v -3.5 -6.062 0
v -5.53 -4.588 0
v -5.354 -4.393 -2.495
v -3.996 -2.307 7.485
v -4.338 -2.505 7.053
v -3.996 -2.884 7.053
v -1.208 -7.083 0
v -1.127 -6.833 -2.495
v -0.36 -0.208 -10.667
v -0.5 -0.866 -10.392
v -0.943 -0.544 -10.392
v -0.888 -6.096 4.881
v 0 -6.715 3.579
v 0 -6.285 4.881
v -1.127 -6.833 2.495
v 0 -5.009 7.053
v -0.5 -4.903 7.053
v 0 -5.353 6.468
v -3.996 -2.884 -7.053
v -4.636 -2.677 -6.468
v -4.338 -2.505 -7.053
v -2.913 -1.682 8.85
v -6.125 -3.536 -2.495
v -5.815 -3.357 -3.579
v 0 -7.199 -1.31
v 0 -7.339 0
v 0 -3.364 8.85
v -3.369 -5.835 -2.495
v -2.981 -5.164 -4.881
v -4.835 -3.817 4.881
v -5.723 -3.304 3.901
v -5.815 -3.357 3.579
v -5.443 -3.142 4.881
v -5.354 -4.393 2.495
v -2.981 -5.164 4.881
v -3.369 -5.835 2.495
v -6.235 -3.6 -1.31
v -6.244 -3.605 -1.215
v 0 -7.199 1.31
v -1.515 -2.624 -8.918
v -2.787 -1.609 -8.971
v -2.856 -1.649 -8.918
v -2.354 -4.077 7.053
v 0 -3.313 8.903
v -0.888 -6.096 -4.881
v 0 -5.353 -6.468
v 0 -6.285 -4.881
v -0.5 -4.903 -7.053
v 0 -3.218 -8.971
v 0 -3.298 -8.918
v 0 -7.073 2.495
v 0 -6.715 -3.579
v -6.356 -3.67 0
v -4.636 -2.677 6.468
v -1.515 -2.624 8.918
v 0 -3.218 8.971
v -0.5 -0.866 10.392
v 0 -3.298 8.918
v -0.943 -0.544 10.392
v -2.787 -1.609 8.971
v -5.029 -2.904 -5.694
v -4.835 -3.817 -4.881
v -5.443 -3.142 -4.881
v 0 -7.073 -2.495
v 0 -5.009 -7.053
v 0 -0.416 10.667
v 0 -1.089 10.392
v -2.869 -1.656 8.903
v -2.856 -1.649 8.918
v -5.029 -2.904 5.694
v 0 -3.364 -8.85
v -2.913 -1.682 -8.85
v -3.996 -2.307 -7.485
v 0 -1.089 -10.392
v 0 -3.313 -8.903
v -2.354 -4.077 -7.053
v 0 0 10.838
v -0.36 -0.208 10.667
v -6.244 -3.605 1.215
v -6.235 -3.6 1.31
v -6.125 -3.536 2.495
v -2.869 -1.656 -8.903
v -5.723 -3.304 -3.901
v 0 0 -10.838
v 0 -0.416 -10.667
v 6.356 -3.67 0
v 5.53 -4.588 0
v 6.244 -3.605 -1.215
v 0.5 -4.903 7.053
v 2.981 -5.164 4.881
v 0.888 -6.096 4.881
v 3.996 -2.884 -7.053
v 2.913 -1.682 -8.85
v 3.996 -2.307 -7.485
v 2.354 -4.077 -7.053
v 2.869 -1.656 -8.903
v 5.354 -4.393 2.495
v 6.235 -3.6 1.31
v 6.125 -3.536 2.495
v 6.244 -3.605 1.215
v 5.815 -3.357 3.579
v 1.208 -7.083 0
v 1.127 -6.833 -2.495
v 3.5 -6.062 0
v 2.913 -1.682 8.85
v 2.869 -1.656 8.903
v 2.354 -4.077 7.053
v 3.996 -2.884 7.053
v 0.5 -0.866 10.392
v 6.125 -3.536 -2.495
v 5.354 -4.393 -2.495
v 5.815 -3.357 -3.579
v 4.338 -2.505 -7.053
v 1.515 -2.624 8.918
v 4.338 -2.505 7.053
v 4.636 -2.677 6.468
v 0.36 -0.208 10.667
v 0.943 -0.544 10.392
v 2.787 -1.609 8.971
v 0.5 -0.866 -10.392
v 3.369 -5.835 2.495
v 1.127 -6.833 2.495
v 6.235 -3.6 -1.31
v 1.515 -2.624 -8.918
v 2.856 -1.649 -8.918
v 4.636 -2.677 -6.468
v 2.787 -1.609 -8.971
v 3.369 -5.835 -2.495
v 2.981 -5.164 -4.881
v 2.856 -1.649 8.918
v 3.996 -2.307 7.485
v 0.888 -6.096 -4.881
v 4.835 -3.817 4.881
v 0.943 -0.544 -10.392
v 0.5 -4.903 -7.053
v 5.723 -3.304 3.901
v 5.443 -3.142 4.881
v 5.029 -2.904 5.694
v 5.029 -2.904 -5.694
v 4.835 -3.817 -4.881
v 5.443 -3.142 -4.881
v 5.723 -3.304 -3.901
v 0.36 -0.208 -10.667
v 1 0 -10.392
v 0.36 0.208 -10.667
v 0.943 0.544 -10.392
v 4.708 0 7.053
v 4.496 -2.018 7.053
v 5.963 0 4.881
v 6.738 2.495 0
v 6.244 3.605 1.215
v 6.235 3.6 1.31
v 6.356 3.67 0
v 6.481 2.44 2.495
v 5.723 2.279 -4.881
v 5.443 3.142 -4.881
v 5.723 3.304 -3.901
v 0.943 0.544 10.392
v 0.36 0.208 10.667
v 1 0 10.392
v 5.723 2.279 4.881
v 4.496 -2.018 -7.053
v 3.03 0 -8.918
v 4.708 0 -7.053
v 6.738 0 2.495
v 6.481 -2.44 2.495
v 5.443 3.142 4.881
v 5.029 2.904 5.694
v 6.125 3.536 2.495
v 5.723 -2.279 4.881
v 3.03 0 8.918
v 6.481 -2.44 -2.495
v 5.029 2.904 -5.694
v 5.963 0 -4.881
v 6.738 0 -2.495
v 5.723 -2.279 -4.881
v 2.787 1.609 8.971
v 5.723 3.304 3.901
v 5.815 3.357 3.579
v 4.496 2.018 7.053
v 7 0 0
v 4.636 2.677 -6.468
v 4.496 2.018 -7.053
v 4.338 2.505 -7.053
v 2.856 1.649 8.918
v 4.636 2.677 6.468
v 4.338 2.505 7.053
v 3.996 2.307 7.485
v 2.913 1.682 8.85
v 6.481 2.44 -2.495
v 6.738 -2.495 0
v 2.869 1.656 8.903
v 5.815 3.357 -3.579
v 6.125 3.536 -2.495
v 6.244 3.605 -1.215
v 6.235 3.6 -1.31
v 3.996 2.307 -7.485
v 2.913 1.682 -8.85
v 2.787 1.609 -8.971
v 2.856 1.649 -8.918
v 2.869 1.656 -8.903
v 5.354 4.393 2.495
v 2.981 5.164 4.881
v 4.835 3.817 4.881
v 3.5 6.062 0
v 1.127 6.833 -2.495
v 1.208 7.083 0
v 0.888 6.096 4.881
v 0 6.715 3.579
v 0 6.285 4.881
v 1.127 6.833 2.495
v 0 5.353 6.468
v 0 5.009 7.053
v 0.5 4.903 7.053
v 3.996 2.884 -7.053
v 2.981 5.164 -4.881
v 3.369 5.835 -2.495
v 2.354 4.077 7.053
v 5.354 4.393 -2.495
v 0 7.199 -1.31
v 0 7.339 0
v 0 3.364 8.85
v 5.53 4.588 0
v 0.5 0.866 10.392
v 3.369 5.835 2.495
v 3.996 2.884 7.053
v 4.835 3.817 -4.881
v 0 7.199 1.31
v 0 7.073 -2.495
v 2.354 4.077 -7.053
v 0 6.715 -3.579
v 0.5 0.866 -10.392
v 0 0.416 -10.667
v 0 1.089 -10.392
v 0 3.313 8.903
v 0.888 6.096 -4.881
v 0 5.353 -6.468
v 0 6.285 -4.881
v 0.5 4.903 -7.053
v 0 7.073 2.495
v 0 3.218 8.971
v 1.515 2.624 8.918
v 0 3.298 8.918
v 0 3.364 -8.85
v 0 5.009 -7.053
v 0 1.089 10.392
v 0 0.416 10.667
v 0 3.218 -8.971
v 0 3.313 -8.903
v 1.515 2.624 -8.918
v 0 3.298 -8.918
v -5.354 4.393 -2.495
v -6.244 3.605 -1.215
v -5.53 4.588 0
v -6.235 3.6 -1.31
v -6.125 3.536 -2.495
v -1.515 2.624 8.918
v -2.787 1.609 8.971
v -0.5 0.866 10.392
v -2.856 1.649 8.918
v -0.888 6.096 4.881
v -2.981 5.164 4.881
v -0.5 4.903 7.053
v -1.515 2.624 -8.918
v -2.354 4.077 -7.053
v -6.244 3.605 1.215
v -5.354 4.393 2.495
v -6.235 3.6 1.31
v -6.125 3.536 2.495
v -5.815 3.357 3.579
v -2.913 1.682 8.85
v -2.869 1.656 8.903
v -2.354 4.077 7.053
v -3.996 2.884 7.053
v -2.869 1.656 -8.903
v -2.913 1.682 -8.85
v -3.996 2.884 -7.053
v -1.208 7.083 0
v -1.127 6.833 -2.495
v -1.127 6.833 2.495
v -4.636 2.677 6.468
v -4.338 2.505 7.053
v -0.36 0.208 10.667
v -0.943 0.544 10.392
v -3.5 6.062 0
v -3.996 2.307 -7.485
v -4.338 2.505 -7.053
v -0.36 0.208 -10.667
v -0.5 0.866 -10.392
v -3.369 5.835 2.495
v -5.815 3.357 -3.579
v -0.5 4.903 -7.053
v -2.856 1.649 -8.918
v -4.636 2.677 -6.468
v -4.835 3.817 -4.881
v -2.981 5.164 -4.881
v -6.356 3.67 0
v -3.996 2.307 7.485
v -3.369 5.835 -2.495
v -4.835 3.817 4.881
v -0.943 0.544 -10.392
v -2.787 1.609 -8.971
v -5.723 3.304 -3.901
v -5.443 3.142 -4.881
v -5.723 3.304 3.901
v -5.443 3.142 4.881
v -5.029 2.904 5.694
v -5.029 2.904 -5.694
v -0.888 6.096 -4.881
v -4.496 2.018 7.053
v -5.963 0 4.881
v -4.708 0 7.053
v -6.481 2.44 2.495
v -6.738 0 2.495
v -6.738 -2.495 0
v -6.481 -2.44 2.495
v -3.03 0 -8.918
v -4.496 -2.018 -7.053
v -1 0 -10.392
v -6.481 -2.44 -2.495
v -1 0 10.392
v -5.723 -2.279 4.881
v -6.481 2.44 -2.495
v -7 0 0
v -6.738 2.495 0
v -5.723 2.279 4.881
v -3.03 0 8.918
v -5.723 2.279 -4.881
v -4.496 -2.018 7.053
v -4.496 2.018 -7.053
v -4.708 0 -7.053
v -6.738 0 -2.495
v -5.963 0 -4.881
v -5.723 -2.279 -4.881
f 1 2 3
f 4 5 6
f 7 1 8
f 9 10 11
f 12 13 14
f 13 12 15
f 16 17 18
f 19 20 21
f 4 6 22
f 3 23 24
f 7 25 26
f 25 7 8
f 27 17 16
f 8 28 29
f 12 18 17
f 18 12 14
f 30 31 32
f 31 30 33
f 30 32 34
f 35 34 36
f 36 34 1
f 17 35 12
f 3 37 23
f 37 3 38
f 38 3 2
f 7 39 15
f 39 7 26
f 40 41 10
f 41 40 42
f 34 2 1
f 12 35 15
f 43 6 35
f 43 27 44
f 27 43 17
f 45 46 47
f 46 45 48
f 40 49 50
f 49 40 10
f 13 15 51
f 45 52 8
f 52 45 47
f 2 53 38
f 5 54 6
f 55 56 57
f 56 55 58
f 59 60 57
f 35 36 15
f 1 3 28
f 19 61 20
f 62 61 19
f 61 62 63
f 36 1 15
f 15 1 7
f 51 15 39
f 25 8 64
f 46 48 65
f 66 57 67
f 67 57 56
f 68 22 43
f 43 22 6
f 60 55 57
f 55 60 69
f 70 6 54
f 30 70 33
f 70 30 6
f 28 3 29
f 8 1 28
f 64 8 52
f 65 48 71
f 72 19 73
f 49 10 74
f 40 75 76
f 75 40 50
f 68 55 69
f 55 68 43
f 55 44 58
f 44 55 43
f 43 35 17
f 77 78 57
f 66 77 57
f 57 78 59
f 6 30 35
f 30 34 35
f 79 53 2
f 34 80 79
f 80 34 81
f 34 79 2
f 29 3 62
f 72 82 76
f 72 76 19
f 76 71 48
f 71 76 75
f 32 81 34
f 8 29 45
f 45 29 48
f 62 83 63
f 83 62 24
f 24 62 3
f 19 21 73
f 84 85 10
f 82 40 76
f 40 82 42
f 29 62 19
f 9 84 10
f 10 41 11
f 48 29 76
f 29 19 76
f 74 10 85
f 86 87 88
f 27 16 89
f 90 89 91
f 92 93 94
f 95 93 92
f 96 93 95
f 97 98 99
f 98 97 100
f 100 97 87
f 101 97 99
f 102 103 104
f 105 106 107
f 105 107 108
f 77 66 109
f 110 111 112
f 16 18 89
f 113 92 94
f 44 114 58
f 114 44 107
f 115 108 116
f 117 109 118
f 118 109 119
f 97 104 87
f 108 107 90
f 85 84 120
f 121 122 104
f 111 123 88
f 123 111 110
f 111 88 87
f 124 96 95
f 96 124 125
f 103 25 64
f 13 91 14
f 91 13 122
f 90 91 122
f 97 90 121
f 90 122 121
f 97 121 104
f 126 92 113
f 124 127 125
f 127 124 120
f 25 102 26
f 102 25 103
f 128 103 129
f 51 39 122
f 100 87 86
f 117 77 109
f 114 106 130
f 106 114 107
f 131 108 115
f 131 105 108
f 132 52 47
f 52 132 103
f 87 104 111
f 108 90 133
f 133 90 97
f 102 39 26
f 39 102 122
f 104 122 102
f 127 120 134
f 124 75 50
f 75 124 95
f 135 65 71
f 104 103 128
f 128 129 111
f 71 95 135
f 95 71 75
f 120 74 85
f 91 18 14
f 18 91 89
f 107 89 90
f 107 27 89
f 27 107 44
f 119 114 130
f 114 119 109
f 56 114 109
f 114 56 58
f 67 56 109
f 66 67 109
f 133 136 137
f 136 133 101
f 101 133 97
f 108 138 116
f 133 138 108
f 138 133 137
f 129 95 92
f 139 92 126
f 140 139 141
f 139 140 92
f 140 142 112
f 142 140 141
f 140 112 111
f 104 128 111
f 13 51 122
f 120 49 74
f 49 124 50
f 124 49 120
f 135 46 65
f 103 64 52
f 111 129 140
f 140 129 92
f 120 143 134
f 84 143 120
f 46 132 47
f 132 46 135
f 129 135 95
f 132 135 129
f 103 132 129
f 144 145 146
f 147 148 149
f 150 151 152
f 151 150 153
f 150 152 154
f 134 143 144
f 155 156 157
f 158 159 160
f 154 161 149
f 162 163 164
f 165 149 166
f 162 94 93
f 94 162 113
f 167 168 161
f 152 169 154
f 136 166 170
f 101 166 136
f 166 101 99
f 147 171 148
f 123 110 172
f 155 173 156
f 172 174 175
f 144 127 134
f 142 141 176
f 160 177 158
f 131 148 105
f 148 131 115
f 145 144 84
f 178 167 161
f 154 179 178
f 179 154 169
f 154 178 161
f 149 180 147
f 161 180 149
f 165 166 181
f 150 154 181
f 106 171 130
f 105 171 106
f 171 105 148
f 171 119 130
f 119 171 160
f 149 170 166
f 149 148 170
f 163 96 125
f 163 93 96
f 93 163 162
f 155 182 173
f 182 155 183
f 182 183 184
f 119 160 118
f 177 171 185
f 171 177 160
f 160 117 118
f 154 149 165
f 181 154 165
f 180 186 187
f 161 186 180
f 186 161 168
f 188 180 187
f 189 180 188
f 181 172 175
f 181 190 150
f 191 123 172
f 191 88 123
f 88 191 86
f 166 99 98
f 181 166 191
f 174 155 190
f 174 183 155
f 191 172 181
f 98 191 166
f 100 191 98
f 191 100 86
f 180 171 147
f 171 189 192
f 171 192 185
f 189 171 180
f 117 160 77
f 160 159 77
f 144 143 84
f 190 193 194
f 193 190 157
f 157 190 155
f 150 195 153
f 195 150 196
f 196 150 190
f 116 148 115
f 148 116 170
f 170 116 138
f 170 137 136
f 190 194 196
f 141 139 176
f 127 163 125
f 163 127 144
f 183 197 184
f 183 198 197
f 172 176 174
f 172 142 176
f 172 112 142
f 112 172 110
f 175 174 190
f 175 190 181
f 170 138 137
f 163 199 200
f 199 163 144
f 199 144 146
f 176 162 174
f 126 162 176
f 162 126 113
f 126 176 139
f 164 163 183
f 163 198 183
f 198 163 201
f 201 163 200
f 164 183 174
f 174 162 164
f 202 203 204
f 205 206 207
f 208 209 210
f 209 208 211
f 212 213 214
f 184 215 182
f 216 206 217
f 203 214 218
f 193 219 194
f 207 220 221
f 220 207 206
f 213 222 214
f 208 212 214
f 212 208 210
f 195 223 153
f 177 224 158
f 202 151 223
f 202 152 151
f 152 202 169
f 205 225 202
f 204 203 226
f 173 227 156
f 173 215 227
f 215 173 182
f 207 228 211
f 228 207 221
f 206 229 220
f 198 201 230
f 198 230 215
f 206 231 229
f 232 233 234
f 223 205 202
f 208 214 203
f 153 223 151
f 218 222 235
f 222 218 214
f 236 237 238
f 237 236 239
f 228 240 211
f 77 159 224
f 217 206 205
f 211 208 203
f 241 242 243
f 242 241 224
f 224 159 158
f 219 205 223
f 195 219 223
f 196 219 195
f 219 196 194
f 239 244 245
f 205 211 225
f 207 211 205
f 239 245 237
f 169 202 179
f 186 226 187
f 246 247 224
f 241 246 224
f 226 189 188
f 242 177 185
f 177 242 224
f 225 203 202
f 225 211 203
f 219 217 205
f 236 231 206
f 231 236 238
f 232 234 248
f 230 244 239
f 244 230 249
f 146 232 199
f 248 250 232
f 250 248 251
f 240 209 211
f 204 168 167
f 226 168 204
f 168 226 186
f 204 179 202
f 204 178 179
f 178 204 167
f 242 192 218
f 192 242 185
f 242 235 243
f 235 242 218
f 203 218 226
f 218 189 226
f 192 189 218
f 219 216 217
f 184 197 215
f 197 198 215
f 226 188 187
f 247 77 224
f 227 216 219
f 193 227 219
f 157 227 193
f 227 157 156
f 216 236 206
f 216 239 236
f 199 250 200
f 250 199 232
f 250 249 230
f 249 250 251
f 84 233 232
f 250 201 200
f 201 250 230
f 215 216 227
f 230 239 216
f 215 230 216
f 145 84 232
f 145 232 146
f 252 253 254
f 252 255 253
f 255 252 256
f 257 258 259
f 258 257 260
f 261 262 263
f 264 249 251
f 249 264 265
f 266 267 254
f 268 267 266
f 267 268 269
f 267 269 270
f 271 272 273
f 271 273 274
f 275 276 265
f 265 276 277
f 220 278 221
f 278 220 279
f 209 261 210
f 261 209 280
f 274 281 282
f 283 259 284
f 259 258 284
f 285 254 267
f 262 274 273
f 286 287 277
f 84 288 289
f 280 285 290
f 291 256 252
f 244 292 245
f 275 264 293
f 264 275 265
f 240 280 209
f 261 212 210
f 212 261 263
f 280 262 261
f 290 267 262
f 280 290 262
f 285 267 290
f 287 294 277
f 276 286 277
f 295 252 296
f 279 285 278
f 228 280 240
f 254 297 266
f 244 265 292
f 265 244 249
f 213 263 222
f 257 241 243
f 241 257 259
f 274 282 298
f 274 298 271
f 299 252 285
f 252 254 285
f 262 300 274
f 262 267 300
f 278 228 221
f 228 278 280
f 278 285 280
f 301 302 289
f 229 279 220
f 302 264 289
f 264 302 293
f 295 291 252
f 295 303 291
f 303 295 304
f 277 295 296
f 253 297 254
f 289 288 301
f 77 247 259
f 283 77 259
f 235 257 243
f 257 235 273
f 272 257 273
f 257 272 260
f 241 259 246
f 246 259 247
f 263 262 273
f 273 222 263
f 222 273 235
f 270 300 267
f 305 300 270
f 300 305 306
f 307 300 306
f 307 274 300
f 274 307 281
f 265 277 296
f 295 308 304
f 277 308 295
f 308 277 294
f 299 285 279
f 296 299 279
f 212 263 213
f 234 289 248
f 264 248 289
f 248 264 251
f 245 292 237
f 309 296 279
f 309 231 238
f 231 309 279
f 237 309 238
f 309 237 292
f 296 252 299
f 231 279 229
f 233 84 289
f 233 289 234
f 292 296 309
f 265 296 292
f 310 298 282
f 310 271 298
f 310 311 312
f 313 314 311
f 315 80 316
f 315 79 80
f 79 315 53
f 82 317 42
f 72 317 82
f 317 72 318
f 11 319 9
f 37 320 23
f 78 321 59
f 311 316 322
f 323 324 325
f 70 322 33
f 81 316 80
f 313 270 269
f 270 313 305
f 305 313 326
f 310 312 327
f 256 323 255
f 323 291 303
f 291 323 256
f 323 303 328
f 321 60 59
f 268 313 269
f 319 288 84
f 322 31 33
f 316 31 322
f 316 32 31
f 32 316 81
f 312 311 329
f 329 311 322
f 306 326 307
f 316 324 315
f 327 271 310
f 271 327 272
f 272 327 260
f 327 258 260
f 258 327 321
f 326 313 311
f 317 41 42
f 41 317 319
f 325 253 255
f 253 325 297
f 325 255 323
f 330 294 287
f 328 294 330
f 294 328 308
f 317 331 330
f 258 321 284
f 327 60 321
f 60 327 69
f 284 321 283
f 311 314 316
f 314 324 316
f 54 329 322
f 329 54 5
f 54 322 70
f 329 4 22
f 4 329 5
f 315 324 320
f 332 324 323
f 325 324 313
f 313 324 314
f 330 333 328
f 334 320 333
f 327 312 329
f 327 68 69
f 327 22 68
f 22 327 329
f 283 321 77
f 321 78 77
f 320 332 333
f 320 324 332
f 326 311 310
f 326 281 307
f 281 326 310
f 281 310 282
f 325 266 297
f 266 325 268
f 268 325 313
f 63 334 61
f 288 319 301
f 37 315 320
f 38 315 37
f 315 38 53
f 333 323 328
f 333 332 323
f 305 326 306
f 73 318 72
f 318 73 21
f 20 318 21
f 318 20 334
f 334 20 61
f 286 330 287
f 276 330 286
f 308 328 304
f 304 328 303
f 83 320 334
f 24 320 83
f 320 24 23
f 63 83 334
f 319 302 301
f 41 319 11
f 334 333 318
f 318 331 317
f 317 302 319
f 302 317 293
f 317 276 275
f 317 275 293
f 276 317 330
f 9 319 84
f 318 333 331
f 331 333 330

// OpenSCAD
intersection_for(n = [1 : 6])
{
    rotate([0, 0, n * 60])
    {
        translate([5,0,0])
        sphere(r=12);
    }
}
